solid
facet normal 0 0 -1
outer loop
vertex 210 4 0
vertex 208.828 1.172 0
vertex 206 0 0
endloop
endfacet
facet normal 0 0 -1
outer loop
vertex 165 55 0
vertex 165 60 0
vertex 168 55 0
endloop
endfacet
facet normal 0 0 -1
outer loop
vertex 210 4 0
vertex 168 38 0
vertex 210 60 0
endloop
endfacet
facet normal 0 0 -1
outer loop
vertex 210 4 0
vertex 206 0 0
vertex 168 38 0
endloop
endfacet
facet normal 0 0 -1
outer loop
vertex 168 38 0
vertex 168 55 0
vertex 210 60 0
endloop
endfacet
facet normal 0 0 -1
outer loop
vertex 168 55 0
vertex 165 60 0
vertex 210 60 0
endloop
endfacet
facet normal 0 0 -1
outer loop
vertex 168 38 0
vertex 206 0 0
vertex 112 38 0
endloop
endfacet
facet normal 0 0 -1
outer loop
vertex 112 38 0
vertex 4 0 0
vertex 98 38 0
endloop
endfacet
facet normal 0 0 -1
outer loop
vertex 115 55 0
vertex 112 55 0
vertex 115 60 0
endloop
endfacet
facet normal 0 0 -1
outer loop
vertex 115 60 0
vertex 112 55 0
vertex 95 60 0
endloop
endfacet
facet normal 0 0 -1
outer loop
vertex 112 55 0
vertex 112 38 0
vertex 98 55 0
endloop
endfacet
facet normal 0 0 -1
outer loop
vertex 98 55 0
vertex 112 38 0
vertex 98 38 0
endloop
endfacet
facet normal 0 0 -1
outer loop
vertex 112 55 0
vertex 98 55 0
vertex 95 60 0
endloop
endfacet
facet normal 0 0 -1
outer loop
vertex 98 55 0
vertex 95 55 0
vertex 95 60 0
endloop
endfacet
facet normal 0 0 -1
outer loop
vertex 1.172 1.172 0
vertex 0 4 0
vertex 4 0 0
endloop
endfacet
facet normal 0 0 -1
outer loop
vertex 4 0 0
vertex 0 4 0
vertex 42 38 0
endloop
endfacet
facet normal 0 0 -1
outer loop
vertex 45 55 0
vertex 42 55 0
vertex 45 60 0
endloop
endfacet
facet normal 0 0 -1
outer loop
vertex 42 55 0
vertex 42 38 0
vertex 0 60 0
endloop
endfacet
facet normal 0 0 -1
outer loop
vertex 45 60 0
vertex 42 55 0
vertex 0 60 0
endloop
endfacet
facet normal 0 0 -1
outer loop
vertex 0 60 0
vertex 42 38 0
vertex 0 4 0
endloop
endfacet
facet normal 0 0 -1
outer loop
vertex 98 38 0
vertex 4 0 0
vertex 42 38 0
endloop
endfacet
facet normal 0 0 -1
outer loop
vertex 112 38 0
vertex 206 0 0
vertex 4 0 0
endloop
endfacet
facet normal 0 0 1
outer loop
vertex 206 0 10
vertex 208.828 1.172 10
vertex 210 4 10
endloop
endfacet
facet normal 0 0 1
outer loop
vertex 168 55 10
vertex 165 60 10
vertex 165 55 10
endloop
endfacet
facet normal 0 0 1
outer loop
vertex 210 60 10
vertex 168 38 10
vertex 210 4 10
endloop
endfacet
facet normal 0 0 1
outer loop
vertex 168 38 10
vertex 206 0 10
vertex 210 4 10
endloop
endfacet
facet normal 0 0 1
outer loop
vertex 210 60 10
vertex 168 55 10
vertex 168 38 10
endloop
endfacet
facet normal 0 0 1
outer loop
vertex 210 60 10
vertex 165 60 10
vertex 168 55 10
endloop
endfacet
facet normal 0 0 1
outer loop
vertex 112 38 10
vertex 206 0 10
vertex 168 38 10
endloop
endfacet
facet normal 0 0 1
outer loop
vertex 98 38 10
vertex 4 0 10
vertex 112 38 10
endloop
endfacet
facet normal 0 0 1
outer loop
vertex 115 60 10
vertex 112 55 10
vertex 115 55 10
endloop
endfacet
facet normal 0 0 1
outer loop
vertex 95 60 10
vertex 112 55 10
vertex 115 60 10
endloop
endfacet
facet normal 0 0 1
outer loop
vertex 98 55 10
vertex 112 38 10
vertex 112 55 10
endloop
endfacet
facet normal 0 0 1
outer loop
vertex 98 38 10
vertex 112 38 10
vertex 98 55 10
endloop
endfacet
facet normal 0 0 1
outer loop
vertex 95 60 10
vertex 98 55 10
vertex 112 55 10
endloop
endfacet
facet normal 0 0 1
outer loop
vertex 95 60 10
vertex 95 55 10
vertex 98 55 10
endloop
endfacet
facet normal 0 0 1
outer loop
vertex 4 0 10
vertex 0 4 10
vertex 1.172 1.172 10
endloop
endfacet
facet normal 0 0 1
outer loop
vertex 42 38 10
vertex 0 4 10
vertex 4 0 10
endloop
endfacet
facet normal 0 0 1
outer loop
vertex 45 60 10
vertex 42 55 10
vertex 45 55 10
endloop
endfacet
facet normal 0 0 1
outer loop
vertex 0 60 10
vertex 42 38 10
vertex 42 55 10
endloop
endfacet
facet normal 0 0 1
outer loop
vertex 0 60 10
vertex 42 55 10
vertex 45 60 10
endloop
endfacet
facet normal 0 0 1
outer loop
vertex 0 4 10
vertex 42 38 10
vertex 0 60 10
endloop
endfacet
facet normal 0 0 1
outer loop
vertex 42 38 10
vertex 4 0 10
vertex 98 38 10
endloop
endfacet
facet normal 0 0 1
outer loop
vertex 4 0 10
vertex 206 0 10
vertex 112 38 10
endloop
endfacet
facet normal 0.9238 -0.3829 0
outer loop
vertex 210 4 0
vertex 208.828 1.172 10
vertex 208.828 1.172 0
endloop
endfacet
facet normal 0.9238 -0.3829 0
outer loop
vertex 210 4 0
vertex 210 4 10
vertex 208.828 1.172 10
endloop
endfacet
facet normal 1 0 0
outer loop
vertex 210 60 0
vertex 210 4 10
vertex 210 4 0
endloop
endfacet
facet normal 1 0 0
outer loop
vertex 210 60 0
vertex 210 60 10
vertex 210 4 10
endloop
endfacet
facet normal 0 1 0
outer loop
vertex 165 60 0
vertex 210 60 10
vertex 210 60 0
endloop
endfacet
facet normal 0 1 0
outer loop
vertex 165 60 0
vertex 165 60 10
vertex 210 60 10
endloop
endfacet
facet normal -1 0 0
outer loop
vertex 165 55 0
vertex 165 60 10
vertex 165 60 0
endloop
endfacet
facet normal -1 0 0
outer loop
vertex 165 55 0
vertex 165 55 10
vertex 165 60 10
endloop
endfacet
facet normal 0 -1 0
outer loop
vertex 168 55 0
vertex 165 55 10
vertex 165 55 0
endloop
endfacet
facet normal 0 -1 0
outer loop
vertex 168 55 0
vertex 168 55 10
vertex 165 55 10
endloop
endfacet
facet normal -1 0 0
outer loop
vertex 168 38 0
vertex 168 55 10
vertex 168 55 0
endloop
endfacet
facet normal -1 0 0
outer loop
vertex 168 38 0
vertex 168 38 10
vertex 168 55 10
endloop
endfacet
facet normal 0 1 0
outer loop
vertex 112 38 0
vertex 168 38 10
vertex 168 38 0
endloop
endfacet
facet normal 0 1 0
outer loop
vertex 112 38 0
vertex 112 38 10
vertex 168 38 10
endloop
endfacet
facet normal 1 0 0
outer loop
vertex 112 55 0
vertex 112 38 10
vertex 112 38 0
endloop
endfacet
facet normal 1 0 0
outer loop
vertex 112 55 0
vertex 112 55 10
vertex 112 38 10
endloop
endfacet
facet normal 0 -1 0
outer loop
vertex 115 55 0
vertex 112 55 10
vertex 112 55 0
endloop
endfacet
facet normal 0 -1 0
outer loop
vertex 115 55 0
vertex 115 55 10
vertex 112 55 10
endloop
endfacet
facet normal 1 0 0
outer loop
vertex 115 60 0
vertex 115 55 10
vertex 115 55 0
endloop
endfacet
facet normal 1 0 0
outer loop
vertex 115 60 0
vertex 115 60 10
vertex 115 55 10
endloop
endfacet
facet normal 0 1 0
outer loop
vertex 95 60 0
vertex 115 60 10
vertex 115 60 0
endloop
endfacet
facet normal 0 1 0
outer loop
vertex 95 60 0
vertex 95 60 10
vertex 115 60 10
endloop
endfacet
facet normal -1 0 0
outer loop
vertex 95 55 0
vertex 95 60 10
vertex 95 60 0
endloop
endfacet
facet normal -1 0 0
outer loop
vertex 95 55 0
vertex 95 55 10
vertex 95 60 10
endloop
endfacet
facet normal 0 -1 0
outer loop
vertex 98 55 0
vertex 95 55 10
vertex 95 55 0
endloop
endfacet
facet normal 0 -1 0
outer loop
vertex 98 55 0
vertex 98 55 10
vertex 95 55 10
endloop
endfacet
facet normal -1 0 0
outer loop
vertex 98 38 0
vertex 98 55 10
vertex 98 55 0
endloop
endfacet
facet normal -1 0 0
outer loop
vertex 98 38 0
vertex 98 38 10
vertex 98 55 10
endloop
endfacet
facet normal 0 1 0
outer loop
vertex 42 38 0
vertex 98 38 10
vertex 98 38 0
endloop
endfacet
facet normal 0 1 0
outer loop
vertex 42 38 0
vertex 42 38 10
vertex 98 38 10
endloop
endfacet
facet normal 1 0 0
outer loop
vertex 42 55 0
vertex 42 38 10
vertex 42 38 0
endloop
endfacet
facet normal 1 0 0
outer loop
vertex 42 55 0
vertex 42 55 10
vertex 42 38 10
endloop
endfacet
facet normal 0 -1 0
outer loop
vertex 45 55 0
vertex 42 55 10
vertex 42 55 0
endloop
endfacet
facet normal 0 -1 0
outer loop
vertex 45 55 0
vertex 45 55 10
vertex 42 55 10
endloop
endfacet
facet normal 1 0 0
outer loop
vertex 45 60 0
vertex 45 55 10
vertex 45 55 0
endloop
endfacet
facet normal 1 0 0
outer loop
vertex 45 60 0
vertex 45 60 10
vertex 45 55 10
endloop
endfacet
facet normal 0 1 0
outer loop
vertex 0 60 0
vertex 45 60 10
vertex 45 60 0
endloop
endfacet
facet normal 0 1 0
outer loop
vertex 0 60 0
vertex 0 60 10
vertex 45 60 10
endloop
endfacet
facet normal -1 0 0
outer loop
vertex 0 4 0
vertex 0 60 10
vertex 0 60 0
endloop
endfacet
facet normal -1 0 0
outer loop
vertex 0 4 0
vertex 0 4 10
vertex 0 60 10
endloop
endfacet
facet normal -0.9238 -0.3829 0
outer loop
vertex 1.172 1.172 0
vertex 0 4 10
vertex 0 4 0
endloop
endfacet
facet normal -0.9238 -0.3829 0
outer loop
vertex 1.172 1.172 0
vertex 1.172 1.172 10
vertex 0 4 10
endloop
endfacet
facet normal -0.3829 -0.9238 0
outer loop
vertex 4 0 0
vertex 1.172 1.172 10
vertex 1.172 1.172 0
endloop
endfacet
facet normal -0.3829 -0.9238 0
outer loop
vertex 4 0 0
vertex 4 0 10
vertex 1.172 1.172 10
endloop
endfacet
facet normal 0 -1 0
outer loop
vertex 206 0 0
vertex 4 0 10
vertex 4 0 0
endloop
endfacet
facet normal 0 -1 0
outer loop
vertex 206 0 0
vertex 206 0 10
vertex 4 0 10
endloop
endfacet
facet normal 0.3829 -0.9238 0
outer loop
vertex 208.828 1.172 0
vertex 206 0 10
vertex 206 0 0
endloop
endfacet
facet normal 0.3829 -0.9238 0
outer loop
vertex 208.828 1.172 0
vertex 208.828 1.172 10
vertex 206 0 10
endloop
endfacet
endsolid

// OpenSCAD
$fn = 32;

// ----------------------------------------------------------------------
// Oversize slot bar: 210 mm bar with 2 oversize windows
// ----------------------------------------------------------------------

// --- parameters (mm) ---
profile_height = 10;      // extrusion height
profile_points = 24;      // points of the closed outline

profile = [[0, 4], [1.172, 1.172], [4, 0], [206, 0], [208.828, 1.172], [210, 4], [210, 60], [165, 60], [165, 55], [168, 55], [168, 38], [112, 38], [112, 55], [115, 55], [115, 60], [95, 60], [95, 55], [98, 55], [98, 38], [42, 38], [42, 55], [45, 55], [45, 60], [0, 60]];  // single closed polygon, 24 points, counter clockwise

// --- the one profile operation ---
linear_extrude(height = profile_height) polygon(points = profile);
